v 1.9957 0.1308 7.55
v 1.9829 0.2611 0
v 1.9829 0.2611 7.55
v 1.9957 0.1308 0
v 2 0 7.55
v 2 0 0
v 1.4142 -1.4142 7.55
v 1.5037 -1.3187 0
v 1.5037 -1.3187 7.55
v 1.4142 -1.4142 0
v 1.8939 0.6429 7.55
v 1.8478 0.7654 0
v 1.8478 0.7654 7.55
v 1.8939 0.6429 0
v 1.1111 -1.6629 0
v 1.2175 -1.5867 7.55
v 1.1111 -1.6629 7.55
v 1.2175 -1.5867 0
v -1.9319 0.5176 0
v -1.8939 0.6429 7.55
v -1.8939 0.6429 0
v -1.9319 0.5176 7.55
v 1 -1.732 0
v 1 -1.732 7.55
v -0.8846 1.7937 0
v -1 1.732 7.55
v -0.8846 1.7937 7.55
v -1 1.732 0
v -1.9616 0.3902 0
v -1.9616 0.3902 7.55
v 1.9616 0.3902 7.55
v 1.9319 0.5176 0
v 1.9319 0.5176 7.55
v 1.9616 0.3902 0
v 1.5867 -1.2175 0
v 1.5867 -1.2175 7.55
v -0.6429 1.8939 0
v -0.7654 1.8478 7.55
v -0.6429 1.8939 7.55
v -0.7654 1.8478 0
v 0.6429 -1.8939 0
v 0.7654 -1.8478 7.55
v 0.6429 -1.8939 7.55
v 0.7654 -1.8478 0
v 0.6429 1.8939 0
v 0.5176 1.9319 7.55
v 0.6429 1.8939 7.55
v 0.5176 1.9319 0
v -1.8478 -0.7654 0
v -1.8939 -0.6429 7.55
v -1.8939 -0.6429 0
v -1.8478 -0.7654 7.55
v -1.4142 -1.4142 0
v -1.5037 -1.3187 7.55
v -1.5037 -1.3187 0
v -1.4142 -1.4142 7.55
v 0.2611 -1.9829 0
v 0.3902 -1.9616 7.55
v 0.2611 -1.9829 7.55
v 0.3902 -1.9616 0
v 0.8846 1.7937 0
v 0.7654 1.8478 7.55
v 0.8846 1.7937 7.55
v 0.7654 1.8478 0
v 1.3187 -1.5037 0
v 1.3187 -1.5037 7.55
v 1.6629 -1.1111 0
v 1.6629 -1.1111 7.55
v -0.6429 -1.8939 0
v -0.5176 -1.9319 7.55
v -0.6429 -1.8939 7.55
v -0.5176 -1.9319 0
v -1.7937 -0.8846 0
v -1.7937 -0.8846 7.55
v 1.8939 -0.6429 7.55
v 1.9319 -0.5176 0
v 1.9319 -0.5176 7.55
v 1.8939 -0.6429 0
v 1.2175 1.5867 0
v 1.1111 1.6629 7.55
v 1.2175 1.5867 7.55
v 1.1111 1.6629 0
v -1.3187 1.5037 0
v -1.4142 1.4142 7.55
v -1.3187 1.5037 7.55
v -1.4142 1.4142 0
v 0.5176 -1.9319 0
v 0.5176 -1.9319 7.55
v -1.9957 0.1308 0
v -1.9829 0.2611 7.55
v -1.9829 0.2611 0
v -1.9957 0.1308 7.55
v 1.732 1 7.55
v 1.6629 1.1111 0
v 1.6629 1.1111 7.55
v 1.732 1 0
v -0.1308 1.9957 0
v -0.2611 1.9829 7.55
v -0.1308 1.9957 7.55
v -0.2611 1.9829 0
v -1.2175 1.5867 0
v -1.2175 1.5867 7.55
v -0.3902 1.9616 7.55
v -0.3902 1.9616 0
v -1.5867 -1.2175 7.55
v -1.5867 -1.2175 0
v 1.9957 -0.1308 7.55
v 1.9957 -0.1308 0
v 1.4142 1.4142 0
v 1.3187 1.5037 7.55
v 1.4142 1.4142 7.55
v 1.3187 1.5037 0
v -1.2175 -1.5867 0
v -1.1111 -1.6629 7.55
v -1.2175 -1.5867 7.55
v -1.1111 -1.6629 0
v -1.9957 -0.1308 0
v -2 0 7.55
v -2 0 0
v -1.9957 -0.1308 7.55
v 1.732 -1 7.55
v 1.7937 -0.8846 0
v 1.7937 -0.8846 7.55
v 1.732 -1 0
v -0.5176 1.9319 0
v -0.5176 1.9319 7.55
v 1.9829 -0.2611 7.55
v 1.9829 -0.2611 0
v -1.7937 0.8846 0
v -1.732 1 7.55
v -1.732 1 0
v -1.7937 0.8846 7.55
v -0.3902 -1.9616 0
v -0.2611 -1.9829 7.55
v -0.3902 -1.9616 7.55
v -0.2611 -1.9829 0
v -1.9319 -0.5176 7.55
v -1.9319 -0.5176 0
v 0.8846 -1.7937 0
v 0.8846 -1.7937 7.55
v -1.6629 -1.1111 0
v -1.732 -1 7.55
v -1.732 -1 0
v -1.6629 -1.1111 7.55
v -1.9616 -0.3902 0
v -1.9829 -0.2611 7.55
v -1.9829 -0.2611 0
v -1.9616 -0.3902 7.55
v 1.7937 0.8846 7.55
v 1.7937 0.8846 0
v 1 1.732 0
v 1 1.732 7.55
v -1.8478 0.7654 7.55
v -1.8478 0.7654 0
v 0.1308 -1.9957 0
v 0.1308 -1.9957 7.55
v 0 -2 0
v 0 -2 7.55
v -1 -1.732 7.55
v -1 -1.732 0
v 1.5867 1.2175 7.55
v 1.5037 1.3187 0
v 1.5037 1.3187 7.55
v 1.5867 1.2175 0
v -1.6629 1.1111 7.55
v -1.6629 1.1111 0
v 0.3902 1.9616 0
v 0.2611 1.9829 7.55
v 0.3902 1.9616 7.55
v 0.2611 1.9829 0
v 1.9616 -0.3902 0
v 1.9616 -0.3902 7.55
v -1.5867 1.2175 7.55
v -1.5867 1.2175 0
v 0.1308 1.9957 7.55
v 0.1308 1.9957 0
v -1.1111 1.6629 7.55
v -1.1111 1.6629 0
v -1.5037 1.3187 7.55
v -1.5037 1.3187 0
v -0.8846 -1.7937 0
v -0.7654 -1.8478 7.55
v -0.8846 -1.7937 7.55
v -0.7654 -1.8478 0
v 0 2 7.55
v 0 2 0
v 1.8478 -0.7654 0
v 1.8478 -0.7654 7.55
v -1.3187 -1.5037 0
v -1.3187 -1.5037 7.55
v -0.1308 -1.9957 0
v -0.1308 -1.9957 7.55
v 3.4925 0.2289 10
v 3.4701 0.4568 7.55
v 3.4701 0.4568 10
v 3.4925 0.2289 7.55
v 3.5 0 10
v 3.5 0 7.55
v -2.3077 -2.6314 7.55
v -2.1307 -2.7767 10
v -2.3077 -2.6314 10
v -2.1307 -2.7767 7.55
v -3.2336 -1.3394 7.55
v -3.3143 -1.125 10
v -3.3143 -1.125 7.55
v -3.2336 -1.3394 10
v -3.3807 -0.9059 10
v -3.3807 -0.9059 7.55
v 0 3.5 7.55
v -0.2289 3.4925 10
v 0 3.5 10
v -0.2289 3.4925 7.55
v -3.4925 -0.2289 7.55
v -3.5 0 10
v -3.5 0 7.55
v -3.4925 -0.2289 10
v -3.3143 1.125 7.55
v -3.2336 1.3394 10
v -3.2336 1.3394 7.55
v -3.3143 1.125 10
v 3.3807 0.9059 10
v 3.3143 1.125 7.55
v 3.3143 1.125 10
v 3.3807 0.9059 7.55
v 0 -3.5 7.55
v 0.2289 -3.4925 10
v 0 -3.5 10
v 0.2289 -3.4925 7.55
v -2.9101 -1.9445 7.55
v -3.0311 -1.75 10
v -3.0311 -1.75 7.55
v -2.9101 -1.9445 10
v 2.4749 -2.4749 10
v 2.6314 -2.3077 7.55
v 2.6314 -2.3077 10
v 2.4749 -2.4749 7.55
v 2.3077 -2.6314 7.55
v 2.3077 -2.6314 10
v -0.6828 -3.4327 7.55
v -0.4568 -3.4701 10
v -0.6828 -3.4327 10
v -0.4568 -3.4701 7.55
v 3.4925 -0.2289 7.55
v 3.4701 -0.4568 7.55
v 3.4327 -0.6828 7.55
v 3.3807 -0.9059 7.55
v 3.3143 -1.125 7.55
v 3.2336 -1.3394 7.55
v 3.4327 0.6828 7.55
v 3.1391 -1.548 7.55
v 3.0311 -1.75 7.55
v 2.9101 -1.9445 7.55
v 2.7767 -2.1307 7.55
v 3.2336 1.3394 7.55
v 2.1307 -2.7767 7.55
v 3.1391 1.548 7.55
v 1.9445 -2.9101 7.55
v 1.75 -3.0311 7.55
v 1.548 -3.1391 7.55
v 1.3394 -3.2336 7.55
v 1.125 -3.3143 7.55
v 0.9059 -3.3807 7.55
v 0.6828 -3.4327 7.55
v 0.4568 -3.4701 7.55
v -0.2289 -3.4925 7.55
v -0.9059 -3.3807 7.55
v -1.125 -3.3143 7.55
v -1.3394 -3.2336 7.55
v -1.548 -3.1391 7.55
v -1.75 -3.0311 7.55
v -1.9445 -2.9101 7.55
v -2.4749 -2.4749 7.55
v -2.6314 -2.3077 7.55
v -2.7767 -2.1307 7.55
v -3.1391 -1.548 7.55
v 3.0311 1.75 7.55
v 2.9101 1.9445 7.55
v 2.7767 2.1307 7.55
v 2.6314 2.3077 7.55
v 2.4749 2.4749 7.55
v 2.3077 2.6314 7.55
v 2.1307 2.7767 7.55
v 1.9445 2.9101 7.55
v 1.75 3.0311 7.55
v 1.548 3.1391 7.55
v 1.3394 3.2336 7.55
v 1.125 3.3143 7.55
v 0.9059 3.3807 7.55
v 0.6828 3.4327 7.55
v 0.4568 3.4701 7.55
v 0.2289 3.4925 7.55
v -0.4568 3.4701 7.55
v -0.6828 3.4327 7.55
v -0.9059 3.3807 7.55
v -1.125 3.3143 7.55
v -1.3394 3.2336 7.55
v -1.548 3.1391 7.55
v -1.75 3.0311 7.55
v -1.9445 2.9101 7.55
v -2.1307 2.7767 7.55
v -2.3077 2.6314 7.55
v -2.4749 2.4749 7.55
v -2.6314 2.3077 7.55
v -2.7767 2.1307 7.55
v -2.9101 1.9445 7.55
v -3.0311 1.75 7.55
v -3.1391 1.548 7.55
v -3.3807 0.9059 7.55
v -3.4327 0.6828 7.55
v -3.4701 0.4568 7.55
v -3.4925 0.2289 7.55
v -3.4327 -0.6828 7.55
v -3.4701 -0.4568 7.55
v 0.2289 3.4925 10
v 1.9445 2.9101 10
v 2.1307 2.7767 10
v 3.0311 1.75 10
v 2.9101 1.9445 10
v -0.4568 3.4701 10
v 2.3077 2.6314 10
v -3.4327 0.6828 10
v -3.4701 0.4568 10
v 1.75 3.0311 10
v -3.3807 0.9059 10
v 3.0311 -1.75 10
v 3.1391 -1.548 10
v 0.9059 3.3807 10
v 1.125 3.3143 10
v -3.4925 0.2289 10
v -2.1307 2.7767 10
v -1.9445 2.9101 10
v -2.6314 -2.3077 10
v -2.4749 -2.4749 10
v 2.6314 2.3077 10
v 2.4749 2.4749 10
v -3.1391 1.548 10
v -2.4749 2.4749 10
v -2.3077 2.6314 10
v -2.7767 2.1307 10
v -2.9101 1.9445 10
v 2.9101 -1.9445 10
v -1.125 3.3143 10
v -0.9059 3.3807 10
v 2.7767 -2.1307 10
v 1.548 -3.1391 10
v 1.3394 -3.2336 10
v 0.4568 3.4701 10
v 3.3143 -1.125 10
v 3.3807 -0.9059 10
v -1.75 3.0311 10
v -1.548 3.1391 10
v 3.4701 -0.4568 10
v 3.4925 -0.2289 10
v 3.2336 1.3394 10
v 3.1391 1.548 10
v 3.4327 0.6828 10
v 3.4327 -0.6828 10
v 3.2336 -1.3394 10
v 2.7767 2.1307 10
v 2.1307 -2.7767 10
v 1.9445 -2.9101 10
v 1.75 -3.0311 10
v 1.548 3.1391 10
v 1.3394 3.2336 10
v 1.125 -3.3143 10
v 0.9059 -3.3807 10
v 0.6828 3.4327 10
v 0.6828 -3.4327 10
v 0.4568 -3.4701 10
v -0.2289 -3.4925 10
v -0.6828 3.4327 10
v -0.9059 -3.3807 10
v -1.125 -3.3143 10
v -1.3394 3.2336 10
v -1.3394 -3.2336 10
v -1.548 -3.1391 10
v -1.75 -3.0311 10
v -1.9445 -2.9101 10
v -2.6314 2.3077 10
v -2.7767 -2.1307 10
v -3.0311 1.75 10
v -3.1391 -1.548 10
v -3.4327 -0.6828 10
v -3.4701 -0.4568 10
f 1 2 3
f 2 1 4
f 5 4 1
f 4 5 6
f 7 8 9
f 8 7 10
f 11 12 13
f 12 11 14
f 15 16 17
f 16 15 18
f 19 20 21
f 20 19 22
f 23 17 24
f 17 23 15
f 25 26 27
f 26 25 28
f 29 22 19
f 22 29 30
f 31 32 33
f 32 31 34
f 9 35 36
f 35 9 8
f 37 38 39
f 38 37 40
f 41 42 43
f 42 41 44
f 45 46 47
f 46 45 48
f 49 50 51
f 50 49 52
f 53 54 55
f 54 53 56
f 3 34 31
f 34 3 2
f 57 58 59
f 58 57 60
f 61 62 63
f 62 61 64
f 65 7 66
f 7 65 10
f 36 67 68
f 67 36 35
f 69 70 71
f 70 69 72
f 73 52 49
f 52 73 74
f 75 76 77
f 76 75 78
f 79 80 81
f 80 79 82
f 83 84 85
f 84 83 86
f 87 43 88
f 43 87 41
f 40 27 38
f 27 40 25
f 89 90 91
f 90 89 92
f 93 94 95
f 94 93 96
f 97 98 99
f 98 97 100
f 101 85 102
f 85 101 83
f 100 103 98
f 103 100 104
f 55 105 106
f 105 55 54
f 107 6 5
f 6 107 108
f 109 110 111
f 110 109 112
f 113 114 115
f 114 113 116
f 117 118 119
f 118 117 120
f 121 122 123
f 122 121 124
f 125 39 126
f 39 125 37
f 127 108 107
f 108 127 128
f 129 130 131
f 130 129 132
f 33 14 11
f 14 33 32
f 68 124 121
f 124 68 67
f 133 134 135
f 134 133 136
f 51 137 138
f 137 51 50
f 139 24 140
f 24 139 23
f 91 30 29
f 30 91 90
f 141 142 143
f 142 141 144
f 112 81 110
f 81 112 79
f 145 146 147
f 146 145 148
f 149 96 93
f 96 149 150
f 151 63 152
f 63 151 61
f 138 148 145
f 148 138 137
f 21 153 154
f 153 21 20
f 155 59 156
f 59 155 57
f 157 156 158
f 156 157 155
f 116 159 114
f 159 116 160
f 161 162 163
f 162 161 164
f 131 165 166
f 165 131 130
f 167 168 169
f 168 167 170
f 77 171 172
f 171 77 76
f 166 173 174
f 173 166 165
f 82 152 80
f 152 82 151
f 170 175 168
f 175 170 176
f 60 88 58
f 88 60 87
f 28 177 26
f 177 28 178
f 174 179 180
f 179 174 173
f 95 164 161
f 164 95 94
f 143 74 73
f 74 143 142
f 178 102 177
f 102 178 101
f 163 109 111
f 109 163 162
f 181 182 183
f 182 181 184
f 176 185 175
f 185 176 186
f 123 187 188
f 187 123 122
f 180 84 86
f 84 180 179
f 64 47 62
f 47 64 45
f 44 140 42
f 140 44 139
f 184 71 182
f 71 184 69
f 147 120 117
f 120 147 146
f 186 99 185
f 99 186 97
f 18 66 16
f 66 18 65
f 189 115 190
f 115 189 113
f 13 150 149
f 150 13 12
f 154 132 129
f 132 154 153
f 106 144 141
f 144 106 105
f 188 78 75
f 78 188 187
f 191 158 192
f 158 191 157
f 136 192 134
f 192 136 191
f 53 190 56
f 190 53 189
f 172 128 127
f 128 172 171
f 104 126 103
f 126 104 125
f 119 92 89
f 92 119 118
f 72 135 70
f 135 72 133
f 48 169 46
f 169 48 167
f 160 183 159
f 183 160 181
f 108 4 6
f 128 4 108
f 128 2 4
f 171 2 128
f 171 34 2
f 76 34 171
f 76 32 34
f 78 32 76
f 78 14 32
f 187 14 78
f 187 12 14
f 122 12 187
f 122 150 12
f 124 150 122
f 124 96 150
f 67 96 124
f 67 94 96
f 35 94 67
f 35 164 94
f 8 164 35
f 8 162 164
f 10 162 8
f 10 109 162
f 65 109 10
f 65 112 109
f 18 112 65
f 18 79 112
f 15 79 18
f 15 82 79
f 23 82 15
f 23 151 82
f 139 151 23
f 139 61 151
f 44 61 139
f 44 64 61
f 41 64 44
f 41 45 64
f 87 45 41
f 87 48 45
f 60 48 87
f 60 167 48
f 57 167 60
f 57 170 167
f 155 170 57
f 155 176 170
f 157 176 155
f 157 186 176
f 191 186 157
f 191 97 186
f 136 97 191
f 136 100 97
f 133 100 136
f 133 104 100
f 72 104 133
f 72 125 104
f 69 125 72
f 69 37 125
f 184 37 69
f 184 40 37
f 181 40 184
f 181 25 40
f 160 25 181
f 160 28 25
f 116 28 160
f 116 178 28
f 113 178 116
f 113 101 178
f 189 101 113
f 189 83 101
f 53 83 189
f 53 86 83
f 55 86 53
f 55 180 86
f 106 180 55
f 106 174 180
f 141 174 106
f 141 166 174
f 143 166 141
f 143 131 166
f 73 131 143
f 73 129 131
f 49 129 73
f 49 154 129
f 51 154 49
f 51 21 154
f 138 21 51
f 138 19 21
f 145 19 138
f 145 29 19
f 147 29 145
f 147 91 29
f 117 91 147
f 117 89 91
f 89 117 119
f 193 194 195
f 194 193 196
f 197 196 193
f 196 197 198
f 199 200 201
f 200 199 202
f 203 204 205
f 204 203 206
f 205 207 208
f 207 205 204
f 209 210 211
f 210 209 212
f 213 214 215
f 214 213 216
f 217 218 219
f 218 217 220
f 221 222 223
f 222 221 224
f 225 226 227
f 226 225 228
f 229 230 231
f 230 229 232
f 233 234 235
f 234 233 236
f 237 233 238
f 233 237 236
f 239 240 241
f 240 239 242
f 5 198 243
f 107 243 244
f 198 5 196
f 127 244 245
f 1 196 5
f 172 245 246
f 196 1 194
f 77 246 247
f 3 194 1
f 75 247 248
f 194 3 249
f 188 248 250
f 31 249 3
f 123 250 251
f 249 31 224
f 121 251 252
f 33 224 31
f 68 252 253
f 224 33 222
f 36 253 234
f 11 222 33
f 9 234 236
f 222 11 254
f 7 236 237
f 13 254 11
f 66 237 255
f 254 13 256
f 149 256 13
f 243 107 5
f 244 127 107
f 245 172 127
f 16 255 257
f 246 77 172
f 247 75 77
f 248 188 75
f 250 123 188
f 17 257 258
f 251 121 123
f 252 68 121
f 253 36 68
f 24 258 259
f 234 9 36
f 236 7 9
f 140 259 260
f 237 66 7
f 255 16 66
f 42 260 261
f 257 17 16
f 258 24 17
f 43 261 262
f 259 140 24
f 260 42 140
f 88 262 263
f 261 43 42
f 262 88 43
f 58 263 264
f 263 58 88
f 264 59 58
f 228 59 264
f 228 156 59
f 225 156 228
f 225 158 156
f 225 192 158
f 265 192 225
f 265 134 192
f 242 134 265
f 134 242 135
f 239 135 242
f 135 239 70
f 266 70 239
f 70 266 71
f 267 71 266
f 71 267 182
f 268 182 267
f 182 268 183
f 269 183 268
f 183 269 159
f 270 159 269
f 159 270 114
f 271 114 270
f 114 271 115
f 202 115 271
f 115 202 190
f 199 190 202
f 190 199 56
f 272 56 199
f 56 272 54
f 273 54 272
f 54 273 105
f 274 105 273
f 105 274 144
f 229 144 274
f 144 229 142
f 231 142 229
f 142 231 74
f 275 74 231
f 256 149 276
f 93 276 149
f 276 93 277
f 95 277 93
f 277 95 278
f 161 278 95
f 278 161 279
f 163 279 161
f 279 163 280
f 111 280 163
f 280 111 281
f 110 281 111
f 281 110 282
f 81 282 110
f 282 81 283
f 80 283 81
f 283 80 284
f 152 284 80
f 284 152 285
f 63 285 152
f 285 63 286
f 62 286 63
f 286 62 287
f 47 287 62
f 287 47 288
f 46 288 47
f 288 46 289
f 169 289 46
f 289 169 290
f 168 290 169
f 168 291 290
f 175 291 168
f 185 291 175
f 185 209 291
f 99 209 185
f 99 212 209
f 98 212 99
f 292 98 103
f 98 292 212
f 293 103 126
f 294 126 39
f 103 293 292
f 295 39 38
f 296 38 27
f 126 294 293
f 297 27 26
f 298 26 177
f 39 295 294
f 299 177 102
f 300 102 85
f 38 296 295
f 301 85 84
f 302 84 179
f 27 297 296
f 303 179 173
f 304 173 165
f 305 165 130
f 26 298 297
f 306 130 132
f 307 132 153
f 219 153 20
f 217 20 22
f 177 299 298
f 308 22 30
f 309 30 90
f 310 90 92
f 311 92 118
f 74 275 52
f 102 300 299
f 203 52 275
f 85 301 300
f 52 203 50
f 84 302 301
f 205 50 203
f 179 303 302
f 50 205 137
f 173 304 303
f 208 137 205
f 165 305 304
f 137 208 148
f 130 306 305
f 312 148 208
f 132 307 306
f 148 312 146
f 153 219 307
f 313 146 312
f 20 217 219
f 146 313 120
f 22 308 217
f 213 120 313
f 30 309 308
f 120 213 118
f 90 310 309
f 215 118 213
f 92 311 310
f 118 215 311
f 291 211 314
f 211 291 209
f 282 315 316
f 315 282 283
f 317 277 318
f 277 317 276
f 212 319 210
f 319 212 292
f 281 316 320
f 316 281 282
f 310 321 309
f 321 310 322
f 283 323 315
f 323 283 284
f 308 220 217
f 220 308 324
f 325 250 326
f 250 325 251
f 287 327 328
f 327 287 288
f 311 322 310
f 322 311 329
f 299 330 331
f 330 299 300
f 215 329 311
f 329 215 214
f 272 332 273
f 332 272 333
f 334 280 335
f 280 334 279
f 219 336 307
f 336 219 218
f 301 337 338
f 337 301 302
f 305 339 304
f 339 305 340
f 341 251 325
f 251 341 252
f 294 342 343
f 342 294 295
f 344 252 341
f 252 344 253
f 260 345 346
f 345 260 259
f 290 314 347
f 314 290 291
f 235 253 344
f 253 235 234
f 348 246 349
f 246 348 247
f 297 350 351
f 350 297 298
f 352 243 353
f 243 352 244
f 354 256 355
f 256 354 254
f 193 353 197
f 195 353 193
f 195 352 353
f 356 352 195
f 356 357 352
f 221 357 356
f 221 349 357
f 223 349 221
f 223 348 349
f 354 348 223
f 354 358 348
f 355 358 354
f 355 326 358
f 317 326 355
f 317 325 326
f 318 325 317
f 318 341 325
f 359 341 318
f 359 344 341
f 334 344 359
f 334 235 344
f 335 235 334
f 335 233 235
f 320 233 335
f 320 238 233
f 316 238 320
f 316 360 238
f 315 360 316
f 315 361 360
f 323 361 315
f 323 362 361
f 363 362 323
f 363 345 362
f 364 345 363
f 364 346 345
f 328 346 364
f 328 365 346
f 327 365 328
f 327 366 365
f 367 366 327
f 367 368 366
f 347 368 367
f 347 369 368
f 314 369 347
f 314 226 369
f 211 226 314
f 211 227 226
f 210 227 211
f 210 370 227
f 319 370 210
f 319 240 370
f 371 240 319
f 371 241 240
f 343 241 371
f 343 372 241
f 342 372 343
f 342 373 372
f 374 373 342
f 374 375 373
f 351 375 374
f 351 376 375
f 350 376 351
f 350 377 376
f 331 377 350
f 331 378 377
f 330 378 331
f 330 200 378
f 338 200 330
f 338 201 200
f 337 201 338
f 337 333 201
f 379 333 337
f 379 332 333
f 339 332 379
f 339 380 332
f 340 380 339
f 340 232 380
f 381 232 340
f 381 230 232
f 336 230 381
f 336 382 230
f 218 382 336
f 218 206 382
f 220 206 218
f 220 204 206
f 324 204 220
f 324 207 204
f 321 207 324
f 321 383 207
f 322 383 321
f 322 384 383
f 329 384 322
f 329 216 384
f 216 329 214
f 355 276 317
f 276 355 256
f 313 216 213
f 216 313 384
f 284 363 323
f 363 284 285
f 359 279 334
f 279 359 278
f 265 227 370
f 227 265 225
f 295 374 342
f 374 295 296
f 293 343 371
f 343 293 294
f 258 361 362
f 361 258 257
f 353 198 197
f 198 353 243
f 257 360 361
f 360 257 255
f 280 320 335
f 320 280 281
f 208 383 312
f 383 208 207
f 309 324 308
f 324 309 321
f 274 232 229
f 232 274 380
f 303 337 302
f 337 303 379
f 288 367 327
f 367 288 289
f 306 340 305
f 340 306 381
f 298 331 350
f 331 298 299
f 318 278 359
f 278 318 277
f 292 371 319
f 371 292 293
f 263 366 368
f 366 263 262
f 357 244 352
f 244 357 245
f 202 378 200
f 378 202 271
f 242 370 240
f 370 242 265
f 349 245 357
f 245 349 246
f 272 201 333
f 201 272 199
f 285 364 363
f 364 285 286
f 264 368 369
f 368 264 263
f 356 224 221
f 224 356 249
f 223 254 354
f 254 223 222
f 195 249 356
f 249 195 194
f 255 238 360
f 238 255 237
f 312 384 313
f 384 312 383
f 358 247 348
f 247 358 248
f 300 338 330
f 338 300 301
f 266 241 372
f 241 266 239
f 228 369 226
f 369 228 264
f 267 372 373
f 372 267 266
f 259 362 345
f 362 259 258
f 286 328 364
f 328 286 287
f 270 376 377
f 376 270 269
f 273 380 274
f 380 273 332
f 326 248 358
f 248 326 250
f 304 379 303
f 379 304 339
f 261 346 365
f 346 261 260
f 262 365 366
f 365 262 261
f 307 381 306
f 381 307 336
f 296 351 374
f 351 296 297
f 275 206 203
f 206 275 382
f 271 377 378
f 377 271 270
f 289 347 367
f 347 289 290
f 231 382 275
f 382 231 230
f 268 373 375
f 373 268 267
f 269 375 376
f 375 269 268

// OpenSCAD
$fn = 96;

module screw(d_shaft=4.0, d_head=7.0, head_h=2.4, total_l=10.0) {
    shank_h = total_l - head_h;
    overlap = 0.05; // small overlap to guarantee a single connected solid

    union() {
        // Shaft (from z=0 to z=shank_h)
        cylinder(h=shank_h + overlap, d=d_shaft, center=false);

        // Head (from z=shank_h to z=total_l)
        translate([0, 0, shank_h - overlap])
            cylinder(h=head_h + overlap, d=d_head, center=false);
    }
}

screw();
